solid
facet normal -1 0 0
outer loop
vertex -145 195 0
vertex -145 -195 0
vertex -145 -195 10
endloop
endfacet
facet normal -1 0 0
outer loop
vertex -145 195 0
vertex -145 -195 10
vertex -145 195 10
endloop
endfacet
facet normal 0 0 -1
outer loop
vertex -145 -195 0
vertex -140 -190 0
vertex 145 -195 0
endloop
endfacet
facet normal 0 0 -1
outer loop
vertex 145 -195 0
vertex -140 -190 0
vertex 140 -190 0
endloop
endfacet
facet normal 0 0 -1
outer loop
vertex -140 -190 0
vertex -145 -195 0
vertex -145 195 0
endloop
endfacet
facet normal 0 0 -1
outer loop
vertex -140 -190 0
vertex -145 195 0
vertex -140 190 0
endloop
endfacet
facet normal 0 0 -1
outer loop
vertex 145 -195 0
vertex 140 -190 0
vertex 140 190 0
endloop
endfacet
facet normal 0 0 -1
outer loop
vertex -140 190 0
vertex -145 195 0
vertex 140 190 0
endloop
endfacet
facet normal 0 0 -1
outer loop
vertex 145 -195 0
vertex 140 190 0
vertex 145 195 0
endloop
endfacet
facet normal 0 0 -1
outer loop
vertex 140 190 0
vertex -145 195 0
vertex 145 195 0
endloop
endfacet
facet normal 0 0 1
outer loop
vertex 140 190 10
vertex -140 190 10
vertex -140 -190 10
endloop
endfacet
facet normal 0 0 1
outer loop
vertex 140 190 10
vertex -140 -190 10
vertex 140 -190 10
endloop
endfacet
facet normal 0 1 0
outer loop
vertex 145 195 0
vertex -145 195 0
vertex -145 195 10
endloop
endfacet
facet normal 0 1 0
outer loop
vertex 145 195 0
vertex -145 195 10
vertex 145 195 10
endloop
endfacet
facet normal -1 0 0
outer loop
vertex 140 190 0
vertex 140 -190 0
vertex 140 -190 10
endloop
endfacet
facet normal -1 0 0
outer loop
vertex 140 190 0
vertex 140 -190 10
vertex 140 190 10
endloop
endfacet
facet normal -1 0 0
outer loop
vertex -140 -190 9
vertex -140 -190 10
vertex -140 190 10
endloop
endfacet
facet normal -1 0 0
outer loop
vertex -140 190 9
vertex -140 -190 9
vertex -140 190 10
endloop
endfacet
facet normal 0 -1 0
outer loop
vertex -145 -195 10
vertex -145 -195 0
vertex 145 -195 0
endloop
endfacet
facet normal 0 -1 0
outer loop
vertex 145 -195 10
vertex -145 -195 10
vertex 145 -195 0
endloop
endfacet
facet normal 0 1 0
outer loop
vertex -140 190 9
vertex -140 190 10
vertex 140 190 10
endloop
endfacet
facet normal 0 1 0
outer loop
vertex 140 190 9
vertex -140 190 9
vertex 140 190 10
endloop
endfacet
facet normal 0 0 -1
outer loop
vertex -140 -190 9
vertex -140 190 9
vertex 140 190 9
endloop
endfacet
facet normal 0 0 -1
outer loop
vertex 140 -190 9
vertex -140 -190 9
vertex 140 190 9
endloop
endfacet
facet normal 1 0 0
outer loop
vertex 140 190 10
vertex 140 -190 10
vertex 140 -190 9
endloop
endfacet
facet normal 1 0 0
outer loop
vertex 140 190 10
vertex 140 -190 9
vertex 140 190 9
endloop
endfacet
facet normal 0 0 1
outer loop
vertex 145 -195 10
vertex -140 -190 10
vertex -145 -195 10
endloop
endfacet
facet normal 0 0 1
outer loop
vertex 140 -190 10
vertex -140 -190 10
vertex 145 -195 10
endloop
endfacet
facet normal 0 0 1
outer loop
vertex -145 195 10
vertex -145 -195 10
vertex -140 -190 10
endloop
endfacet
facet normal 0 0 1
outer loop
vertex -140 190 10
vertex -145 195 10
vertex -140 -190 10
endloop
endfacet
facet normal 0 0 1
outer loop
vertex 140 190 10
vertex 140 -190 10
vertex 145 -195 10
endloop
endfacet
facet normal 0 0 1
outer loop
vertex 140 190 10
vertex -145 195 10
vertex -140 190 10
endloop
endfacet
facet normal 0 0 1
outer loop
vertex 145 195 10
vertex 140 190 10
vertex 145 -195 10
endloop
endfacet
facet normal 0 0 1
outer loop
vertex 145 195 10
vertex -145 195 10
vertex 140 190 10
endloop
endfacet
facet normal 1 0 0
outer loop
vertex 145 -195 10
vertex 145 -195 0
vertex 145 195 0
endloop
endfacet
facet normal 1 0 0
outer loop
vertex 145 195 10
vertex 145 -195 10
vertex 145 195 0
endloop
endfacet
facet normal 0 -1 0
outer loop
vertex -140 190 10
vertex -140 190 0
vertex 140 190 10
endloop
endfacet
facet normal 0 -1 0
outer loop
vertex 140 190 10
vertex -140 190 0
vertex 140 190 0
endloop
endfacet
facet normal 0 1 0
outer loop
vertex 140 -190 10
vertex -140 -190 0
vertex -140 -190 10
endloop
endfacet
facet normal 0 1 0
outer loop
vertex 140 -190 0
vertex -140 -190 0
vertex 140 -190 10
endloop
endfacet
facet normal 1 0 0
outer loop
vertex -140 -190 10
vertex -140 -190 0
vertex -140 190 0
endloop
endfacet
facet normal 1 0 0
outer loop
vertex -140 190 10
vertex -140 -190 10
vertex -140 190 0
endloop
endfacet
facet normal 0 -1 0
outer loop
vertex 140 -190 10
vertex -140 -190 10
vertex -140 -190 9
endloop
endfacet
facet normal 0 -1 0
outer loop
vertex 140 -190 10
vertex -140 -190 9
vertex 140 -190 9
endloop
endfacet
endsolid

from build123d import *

# Parameters (mm, degrees)
SKETCH1_W           = 290
SKETCH1_H           = 390
SKETCH1_W_2         = 280
SKETCH1_H_2         = 380
BOSS_EXTRUDE1_DEPTH = 10
SKETCH2_W           = 280
SKETCH2_H           = 380
BOSS_EXTRUDE2_DEPTH = 1


with BuildPart() as part:
    # Sketch1 → Boss-Extrude1 (new body)
    with BuildSketch(Plane.XY):
        Rectangle(SKETCH1_W, SKETCH1_H)
        Rectangle(SKETCH1_W_2, SKETCH1_H_2, mode=Mode.SUBTRACT)
    extrude(amount=BOSS_EXTRUDE1_DEPTH)


with BuildPart() as body_2:
    # Sketch2 → Boss-Extrude2 (new body)
    with BuildSketch(Plane.XY.offset(10)):
        Rectangle(SKETCH2_W, SKETCH2_H)
    extrude(amount=-BOSS_EXTRUDE2_DEPTH)


solid = Compound([part.part, body_2.part])
